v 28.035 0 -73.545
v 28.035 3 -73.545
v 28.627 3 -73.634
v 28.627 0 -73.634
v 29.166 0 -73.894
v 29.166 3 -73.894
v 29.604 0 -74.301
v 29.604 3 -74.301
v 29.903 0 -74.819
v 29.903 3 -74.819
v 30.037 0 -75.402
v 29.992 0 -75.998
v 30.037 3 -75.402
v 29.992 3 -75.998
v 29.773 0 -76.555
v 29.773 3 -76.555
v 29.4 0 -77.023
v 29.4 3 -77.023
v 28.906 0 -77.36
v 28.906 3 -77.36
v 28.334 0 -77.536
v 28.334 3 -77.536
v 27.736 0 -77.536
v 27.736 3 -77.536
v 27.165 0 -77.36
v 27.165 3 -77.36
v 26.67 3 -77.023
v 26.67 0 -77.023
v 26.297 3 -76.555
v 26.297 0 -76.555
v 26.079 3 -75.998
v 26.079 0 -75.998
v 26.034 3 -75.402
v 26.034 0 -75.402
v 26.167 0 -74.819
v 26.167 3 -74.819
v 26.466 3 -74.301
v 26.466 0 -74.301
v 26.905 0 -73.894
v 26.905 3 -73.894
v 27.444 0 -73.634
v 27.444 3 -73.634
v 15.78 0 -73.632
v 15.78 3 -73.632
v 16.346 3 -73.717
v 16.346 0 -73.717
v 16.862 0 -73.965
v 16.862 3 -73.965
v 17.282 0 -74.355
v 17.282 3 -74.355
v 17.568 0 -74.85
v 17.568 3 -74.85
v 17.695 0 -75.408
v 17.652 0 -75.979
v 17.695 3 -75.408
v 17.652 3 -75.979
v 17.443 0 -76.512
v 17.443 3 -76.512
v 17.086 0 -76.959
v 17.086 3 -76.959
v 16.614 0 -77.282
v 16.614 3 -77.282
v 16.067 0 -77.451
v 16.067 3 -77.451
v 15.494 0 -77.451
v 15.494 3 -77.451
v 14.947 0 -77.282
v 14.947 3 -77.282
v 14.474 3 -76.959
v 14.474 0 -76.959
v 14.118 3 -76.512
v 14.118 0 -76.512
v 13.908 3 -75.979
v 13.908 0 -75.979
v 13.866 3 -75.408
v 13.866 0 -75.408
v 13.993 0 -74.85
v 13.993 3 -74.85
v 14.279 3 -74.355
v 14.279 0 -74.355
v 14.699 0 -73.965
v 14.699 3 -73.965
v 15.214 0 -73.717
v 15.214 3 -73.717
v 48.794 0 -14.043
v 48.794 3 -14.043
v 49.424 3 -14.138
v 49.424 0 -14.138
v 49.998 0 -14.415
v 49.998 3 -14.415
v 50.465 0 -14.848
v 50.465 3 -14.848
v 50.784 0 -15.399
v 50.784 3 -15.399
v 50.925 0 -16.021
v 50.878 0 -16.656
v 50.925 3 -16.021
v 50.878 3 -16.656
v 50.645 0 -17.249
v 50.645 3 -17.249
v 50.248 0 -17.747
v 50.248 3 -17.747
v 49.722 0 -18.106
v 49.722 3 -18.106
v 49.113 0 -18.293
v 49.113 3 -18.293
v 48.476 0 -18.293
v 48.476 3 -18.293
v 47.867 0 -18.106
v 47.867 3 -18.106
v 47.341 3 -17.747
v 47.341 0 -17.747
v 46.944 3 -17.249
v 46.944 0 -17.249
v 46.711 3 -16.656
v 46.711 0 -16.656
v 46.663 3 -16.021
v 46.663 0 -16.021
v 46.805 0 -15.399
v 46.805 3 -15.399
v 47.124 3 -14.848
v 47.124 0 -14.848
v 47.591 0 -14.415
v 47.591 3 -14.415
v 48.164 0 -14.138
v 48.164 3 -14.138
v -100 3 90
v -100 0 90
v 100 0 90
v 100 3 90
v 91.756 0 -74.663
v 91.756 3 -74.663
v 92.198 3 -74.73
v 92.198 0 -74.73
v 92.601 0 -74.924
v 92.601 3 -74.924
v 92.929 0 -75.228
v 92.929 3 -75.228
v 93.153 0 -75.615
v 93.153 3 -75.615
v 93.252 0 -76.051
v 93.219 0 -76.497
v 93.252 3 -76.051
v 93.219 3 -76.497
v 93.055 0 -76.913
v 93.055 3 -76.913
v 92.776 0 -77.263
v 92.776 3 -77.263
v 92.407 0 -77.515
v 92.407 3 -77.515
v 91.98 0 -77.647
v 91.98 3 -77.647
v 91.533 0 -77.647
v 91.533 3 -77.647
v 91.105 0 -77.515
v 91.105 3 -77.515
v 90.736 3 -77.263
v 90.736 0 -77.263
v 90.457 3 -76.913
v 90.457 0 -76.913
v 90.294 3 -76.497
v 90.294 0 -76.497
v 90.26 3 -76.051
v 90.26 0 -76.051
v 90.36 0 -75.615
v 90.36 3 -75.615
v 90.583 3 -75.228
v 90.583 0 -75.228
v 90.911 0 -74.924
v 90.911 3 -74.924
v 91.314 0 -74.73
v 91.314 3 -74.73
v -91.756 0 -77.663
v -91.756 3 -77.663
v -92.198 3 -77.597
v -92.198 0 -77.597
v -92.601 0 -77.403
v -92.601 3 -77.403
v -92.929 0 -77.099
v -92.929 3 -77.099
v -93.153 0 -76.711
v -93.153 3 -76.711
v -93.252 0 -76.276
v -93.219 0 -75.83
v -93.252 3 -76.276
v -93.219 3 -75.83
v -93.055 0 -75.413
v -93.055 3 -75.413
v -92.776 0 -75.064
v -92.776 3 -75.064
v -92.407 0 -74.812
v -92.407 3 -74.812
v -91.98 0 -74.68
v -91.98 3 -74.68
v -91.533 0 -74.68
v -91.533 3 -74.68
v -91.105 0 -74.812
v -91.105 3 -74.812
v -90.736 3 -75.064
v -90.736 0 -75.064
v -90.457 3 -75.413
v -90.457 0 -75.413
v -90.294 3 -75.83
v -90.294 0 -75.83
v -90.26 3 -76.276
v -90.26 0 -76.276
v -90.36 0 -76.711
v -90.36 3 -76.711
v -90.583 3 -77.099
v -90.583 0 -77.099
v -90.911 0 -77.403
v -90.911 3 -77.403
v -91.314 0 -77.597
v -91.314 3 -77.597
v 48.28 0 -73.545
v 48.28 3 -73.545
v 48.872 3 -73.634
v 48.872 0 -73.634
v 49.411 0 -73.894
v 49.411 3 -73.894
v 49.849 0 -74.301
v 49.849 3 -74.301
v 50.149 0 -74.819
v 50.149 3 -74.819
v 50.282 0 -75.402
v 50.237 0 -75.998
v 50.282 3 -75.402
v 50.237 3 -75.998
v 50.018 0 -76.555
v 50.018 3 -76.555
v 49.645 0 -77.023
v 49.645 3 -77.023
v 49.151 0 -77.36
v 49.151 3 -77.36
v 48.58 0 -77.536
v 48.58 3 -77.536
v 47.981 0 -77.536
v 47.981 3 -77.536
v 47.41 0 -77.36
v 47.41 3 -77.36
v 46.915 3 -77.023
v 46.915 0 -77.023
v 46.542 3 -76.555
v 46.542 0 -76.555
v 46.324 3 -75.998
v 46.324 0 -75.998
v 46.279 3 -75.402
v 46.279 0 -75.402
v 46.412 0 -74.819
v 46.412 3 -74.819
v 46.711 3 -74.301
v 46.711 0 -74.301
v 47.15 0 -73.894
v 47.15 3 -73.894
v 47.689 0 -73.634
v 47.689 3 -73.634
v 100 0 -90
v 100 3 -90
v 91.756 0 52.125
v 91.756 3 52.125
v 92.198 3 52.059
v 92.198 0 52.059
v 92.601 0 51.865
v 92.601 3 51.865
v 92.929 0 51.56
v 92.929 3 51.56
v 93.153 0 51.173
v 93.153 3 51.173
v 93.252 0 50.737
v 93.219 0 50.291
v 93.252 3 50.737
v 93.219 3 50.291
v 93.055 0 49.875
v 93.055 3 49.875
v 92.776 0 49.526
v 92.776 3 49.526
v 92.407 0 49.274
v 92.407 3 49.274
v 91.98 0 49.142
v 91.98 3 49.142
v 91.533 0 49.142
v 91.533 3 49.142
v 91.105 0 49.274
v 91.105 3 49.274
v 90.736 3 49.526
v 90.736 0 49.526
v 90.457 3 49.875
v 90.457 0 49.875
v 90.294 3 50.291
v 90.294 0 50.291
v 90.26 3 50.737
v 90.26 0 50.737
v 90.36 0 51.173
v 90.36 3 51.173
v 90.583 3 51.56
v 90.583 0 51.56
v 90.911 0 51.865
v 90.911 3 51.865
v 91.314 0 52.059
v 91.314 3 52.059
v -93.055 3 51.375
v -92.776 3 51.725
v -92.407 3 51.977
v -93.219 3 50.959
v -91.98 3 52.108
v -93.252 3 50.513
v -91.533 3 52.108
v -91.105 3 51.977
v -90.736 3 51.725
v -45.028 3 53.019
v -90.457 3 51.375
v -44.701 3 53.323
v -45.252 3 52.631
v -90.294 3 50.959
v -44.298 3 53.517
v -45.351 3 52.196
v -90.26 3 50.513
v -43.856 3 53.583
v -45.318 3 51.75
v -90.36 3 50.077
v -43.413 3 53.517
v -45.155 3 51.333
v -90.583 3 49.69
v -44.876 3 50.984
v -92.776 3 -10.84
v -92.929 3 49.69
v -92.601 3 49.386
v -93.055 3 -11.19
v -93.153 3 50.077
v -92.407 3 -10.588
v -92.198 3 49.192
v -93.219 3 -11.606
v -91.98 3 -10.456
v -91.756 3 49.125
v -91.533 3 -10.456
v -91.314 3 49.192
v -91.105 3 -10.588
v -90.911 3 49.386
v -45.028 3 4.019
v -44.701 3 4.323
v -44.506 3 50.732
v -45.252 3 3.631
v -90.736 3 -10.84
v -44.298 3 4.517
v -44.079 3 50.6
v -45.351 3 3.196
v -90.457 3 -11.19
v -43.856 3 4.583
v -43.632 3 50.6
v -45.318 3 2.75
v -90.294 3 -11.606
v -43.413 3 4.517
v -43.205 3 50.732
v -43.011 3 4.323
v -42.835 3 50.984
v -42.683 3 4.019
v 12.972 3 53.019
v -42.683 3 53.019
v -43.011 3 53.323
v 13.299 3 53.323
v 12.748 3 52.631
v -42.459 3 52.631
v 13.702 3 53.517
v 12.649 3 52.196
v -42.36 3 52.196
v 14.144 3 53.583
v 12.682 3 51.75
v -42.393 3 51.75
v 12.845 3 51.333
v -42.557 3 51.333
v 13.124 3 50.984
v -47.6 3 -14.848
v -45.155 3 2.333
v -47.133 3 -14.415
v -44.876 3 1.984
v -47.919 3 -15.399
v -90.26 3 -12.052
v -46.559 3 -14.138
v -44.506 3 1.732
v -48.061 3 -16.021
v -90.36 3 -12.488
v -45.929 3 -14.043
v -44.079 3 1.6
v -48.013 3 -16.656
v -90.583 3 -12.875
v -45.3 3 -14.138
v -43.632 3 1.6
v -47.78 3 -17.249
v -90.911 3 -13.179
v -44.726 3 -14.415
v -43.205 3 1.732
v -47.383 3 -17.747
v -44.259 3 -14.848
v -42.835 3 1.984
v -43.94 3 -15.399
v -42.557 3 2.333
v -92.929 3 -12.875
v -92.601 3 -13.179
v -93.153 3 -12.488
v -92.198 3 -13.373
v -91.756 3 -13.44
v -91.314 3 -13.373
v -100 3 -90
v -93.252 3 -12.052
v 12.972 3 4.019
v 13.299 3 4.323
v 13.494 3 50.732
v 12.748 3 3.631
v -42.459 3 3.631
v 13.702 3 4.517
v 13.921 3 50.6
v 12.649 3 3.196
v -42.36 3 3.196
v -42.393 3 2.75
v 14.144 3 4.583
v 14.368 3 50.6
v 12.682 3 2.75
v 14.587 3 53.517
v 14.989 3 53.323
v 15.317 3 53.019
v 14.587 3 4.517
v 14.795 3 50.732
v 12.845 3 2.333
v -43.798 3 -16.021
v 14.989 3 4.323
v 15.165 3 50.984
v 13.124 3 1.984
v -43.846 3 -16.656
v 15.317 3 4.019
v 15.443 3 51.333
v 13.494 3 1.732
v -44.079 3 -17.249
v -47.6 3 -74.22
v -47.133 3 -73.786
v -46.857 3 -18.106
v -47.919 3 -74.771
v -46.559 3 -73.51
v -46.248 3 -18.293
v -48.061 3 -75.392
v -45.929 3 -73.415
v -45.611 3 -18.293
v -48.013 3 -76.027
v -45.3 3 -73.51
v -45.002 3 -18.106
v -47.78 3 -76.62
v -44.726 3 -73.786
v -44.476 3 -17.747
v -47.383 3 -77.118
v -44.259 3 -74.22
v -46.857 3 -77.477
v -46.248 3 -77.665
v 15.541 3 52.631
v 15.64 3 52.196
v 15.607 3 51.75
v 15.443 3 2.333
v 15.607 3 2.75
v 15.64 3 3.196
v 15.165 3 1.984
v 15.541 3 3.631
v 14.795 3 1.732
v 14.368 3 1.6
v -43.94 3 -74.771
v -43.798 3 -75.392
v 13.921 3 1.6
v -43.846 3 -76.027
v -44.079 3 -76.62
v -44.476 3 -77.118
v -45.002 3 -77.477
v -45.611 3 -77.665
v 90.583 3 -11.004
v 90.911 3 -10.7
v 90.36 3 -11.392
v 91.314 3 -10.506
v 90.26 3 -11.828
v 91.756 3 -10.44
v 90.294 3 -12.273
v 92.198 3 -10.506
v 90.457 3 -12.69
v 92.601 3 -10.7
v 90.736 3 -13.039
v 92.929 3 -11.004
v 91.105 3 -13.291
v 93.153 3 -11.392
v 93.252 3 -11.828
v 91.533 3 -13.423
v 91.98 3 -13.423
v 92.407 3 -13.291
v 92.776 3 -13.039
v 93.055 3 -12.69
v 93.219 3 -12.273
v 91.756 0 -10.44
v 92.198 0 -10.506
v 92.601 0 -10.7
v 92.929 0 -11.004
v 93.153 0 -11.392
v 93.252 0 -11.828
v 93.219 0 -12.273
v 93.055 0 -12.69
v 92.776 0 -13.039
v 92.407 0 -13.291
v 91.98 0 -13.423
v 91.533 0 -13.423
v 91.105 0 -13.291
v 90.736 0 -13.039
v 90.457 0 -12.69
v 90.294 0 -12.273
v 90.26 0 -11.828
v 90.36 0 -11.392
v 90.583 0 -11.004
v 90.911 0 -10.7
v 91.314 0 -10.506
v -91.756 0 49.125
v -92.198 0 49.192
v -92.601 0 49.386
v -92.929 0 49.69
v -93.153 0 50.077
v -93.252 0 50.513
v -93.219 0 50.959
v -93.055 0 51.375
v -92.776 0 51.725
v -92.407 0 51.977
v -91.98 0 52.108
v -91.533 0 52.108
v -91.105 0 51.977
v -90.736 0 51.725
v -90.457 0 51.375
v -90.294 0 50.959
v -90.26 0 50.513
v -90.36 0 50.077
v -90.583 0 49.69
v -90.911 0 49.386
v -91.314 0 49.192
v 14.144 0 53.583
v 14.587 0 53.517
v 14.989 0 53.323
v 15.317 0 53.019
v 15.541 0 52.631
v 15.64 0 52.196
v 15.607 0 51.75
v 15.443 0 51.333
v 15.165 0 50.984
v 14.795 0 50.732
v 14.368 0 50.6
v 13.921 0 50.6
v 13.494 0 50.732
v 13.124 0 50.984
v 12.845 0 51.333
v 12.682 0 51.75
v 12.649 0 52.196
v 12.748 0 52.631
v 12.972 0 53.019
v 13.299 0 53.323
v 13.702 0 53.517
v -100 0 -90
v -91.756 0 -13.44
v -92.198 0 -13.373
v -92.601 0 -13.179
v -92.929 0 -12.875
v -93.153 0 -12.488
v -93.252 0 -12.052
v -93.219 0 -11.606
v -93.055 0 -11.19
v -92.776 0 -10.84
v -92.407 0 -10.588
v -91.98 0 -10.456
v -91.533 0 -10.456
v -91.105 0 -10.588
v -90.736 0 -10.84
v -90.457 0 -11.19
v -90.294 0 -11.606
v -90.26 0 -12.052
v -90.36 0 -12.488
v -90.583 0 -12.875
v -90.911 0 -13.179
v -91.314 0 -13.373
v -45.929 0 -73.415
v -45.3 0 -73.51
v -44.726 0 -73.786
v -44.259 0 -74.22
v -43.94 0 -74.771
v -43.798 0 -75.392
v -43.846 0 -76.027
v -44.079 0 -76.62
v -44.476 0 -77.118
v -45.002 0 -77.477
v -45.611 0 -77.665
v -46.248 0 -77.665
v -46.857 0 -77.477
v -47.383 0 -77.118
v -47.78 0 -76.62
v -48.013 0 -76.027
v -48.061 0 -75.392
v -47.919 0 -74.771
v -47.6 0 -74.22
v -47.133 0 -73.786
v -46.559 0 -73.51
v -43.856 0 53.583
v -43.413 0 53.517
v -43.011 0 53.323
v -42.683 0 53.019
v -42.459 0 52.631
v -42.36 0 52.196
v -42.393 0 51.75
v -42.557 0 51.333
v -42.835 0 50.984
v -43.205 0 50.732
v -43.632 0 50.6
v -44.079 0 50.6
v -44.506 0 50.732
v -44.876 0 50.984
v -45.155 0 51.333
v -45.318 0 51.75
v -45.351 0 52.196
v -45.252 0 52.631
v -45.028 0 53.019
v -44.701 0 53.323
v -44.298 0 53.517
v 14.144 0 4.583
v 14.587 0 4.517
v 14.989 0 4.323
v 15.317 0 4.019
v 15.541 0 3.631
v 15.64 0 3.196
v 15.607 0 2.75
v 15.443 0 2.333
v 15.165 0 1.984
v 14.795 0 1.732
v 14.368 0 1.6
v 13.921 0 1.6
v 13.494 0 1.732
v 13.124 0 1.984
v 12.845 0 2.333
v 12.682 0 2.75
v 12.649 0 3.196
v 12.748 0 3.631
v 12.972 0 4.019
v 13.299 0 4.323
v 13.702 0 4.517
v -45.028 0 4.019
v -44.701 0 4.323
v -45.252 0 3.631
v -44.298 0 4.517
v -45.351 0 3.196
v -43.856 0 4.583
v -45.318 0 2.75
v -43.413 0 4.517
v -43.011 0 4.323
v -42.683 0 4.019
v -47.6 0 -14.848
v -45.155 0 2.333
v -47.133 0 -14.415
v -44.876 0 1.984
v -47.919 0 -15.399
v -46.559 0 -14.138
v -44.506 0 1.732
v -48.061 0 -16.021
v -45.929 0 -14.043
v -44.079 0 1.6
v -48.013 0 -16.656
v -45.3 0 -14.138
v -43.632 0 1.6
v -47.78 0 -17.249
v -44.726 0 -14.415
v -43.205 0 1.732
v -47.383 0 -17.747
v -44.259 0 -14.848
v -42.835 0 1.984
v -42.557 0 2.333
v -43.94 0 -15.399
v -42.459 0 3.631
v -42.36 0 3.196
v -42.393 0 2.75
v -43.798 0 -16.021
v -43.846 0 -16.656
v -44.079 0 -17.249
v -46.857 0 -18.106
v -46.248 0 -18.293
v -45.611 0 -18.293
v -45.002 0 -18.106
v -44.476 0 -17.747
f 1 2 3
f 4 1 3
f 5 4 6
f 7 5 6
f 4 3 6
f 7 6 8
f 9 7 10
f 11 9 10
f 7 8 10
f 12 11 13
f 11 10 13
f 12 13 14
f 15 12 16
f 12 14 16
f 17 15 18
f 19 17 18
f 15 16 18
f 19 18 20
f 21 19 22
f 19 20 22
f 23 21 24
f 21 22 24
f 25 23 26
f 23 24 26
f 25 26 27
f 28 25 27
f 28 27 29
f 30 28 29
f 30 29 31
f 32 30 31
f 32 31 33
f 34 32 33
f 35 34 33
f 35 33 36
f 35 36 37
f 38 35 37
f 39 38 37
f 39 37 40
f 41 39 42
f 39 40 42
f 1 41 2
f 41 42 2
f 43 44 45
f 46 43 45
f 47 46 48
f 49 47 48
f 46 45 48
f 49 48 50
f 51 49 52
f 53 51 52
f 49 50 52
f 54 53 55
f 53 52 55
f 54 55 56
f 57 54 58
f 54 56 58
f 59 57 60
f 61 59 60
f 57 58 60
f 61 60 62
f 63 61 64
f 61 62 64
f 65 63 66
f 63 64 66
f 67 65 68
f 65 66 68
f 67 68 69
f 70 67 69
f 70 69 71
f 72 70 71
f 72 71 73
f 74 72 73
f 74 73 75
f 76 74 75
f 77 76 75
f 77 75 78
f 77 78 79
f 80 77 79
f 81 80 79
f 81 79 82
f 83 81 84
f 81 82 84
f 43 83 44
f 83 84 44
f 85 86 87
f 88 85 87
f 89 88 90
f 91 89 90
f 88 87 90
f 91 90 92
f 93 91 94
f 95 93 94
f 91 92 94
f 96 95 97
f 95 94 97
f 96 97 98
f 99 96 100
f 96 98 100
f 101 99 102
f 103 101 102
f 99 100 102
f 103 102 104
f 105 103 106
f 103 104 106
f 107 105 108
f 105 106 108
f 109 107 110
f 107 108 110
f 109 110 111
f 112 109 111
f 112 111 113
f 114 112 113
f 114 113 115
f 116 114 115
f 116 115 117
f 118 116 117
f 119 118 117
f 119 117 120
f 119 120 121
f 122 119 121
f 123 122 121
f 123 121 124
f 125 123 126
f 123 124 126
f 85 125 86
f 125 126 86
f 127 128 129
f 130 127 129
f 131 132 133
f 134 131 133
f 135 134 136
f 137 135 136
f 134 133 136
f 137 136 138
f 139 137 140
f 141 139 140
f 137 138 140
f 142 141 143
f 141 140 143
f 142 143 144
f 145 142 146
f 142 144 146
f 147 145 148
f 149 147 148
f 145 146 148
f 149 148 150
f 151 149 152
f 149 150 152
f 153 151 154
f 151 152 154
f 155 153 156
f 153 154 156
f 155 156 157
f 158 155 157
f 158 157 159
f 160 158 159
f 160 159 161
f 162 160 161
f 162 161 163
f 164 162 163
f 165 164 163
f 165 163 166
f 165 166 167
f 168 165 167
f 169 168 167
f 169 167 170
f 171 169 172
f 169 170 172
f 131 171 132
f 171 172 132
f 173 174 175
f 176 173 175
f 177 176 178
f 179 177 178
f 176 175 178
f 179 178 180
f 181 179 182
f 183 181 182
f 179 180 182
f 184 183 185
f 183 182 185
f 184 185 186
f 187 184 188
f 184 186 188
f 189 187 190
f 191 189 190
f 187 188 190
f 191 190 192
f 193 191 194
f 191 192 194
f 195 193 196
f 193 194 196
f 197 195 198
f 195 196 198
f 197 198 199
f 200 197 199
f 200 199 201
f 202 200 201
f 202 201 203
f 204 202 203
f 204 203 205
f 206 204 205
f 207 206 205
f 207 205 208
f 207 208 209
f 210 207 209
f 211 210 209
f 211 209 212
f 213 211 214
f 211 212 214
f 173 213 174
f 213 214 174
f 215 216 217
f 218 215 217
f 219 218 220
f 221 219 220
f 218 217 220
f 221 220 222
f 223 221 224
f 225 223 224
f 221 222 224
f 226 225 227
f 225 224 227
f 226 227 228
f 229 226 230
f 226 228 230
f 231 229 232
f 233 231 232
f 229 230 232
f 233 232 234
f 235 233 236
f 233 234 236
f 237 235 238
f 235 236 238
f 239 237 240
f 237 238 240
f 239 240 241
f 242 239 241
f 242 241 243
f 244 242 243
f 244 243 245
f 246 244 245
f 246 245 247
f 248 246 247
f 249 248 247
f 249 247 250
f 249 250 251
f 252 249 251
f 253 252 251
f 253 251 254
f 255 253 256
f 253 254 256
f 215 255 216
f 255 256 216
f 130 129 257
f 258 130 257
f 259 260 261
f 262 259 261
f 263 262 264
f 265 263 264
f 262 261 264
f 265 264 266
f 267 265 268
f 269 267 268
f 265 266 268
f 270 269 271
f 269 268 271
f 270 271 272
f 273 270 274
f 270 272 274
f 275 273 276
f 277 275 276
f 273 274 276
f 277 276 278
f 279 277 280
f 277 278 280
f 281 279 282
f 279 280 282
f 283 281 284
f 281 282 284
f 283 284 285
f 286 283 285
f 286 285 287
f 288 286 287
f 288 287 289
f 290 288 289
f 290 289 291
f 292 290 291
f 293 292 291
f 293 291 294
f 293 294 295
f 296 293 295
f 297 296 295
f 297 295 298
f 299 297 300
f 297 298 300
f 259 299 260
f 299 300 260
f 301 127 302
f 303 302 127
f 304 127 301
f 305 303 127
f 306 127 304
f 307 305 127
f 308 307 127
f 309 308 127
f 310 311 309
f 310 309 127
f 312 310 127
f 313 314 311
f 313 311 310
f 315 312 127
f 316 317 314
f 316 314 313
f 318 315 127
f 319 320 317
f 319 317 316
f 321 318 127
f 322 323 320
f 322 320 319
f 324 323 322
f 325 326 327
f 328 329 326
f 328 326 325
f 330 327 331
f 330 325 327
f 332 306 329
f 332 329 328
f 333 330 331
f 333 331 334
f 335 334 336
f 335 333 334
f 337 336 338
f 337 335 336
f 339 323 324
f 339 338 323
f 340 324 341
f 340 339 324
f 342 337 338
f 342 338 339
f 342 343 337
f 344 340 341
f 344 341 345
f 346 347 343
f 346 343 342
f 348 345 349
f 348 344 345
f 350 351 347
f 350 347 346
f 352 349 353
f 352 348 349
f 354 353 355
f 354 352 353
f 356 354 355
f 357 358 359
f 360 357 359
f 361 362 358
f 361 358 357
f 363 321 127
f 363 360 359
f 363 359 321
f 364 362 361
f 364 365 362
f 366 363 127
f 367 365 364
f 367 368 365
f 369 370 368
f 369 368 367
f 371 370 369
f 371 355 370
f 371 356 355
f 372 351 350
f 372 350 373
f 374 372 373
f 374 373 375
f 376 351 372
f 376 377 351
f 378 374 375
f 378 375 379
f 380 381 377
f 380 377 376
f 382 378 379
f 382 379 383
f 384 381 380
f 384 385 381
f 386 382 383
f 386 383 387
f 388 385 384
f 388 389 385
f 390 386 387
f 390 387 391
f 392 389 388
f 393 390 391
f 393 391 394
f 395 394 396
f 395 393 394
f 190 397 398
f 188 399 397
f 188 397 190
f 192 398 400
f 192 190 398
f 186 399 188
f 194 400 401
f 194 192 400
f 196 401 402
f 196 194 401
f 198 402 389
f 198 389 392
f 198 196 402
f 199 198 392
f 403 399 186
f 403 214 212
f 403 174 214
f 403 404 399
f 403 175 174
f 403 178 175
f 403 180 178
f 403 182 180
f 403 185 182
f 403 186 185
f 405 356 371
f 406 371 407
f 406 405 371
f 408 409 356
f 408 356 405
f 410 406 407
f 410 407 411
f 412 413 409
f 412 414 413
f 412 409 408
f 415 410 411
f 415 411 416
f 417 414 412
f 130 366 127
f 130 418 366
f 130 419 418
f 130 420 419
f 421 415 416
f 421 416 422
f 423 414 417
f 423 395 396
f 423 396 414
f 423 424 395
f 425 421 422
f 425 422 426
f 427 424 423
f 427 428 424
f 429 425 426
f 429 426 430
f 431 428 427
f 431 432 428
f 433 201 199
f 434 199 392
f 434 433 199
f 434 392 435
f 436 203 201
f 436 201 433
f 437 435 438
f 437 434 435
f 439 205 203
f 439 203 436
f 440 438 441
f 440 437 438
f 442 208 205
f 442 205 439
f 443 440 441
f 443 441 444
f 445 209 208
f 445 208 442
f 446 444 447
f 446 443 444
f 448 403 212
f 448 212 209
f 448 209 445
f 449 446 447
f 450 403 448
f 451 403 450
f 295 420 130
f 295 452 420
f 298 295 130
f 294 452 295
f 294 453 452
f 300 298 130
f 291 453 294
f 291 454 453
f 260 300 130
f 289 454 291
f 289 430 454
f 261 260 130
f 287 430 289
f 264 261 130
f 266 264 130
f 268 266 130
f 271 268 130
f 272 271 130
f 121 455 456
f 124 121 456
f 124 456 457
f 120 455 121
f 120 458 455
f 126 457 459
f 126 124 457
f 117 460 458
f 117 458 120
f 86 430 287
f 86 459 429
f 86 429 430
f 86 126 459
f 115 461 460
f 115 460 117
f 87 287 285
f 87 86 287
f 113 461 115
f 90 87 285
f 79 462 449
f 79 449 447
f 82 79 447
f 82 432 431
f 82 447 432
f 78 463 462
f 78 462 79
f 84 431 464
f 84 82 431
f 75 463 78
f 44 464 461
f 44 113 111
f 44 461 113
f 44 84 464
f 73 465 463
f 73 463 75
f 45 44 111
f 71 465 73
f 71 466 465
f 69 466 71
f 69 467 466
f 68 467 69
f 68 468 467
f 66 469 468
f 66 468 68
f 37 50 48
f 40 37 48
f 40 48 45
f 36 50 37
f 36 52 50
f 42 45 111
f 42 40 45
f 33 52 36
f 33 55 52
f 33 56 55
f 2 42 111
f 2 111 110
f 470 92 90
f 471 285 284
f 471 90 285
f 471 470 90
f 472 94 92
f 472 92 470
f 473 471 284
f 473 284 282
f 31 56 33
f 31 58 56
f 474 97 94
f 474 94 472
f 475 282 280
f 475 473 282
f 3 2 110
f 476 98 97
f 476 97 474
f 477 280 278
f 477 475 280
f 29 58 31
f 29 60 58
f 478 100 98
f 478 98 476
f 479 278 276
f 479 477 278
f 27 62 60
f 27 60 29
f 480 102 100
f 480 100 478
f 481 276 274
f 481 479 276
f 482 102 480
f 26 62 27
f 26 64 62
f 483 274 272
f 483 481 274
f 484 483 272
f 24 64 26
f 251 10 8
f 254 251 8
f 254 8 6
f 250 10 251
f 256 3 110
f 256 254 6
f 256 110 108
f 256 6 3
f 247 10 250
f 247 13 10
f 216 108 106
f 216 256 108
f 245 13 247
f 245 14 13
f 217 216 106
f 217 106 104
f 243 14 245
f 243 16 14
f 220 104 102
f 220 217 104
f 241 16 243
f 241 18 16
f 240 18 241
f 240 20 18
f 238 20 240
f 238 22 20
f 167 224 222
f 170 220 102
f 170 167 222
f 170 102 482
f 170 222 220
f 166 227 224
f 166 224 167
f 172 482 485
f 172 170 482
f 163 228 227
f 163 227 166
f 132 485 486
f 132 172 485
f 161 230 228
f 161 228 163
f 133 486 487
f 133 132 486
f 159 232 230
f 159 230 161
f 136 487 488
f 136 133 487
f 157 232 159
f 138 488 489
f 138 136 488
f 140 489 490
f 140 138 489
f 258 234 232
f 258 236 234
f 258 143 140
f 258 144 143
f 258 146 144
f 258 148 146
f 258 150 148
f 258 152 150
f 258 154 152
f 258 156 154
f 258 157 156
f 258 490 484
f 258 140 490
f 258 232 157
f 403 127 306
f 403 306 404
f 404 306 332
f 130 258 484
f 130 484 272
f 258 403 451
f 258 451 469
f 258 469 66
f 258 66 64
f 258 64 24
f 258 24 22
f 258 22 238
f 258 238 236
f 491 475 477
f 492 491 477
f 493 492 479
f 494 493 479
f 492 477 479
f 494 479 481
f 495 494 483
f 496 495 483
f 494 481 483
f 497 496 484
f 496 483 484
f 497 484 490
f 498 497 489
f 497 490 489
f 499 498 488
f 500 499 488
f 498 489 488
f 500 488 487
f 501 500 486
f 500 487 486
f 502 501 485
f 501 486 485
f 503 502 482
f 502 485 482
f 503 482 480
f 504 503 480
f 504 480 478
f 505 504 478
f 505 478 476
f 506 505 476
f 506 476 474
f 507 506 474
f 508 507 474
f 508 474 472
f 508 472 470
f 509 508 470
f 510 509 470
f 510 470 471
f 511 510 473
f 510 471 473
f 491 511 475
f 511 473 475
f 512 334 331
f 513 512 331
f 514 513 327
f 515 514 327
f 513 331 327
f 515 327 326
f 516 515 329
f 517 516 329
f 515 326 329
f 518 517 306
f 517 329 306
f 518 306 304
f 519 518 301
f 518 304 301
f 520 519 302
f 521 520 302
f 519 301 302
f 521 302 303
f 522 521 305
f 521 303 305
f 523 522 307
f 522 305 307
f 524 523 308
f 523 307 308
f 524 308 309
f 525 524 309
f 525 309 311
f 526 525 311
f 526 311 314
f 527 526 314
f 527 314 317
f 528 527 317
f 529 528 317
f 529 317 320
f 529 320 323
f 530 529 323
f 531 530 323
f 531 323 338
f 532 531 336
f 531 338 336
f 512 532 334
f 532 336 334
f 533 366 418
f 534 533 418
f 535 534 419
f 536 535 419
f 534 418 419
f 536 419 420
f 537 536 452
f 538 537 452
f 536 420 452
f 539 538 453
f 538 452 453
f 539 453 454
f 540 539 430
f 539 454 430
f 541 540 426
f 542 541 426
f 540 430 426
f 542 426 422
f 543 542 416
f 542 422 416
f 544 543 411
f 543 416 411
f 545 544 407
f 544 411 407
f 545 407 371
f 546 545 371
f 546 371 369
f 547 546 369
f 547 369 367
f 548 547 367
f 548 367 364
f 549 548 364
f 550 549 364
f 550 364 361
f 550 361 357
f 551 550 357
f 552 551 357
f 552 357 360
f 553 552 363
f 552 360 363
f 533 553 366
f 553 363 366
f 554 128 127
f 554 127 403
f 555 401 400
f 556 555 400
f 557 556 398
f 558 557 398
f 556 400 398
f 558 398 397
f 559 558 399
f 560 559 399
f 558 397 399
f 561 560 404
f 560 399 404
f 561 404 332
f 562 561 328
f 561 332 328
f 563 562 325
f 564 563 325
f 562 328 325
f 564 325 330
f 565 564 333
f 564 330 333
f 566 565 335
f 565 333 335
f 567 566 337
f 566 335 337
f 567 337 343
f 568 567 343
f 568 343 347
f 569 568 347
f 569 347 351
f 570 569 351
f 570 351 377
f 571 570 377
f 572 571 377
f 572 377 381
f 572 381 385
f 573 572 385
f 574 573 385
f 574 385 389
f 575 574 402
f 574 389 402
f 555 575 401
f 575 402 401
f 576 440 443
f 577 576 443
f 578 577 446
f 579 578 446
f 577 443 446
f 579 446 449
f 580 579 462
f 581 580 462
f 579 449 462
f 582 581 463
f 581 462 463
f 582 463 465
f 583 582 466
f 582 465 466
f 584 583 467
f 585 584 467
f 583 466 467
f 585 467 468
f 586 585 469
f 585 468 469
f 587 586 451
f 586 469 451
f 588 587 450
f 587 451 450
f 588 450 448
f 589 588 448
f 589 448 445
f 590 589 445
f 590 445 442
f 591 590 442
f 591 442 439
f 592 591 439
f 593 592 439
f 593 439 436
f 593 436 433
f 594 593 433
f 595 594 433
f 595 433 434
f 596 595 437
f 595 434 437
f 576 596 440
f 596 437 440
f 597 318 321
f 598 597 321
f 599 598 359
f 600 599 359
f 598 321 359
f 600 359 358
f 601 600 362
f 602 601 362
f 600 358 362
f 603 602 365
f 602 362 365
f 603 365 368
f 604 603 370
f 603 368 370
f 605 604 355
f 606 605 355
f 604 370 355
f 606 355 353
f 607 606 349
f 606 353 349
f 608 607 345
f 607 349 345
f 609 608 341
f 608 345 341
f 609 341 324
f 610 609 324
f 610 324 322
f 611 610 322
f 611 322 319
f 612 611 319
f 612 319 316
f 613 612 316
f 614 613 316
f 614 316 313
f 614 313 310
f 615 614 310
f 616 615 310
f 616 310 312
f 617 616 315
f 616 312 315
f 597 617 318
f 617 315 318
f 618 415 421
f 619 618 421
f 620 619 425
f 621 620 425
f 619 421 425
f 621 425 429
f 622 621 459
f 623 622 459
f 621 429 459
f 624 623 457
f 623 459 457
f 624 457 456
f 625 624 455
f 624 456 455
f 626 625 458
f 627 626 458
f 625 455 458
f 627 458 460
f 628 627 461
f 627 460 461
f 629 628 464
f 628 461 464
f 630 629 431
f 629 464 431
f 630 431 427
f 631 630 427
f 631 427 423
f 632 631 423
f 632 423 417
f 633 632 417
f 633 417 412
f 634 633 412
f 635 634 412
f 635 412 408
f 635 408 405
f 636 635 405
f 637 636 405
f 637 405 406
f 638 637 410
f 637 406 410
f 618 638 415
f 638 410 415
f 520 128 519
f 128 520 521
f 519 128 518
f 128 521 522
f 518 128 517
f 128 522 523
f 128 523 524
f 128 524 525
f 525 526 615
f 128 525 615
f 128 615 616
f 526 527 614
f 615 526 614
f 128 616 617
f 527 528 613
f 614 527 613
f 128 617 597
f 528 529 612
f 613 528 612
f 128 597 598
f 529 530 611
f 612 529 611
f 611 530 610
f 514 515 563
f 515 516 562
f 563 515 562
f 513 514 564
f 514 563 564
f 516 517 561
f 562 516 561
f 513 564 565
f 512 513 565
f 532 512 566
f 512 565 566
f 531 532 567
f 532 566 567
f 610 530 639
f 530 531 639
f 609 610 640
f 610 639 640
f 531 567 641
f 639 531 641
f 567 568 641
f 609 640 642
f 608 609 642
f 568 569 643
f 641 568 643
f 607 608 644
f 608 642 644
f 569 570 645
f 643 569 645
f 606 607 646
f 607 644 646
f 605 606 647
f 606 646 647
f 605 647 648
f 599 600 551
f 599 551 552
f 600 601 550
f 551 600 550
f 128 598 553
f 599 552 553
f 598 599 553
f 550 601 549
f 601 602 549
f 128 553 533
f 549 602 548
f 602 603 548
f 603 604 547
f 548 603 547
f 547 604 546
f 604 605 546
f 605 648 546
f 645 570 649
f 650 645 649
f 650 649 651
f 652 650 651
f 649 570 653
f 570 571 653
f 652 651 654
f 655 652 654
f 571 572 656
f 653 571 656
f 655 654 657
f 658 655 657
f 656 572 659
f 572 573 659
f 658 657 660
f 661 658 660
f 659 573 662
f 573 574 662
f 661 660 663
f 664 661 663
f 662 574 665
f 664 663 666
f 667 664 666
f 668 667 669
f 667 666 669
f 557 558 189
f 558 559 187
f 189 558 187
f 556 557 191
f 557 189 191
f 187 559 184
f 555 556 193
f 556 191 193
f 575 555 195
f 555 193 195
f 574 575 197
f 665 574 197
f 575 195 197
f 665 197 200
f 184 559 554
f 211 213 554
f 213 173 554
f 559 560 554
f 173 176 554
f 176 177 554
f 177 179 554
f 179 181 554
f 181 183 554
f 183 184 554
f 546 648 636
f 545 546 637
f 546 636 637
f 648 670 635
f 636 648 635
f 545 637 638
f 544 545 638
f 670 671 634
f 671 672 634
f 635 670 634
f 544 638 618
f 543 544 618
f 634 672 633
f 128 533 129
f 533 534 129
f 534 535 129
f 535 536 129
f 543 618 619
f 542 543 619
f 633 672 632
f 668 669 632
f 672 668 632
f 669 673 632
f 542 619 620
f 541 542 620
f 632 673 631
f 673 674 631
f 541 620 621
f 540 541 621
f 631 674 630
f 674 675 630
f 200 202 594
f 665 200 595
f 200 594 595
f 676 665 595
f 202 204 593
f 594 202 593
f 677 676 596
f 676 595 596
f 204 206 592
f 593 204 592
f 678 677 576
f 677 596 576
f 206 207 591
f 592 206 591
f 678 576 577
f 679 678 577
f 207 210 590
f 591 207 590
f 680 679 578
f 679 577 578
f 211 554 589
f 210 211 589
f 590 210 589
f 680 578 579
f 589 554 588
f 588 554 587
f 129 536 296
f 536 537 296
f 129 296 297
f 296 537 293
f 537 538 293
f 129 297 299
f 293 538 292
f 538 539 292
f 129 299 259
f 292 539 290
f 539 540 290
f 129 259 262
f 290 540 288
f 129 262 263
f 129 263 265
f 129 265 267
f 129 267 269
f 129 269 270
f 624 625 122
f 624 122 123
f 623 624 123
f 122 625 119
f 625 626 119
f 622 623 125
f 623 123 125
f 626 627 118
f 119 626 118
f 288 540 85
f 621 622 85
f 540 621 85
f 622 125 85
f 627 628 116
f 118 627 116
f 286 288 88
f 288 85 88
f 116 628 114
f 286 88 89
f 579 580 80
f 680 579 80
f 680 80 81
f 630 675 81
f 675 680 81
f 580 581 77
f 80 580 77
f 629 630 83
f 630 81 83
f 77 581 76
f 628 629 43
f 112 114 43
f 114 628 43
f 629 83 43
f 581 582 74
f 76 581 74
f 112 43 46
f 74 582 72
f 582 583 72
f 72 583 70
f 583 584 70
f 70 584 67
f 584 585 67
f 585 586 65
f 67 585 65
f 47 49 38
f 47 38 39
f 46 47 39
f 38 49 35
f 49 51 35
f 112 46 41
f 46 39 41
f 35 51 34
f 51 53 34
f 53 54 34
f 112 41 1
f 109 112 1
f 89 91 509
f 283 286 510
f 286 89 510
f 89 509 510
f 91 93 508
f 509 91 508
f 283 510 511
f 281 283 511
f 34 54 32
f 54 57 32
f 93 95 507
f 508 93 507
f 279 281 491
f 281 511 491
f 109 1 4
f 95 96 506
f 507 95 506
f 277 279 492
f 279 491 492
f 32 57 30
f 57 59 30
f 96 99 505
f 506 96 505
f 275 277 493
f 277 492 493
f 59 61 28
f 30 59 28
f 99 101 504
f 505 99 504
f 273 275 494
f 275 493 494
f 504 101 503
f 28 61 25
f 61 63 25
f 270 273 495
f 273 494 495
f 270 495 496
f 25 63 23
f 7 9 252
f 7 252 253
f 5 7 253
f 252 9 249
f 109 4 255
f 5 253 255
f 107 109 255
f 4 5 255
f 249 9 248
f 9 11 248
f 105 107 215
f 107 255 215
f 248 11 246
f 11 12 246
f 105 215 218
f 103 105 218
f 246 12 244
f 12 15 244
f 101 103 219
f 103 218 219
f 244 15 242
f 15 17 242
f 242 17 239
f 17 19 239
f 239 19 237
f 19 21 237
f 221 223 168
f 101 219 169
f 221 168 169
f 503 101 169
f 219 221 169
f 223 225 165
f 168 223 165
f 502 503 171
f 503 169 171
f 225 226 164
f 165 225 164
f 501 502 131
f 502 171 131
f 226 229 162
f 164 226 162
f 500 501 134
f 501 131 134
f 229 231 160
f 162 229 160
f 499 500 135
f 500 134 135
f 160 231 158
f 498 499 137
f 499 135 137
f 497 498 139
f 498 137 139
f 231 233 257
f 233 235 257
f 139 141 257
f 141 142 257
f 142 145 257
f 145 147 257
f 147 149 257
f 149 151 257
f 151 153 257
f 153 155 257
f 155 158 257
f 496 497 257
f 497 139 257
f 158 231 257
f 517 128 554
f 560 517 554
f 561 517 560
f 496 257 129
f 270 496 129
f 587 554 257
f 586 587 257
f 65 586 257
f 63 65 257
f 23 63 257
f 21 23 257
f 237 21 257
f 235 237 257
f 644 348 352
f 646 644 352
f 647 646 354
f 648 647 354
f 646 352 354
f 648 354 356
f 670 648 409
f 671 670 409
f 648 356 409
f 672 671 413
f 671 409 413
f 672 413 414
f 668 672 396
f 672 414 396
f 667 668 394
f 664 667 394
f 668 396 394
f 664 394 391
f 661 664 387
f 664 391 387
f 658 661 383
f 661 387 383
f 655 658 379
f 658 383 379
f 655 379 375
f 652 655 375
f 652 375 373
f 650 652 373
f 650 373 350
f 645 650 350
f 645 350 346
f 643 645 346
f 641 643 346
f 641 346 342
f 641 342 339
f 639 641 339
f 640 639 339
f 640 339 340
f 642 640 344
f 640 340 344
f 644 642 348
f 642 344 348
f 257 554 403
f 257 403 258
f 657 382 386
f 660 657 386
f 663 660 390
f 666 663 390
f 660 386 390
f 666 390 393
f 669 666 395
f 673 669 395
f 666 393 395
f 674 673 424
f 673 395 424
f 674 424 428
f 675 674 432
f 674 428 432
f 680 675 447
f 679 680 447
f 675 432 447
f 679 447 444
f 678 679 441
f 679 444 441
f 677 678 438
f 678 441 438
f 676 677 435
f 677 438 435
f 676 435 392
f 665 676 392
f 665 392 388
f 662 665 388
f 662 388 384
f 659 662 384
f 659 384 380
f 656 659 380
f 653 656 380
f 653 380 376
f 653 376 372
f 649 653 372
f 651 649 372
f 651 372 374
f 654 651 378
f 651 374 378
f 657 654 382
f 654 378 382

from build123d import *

# Parameters (mm, degrees)
SKETCH_1_W          = 200
SKETCH_1_H          = 180
EXTRUDE_1_DEPTH     = 3
SKETCH_2_R          = 1.5
CUT_EXTRUDE_1_DEPTH = 3
SKETCH_3_R          = 1.5
CUT_EXTRUDE_2_DEPTH = 3
SKETCH_4_R          = 2.137012609
SKETCH_4_R_2        = 2.00688496
SKETCH_4_R_3        = 1.920113274
CUT_EXTRUDE_3_DEPTH = 3


with BuildPart() as part:
    # 草图1 → 凸台-拉伸1 (new body)
    with BuildSketch(Plane(origin=(0, 0, 0), x_dir=(1, 0, 0), z_dir=(0, 1, 0))):
        Rectangle(SKETCH_1_W, SKETCH_1_H)
    extrude(amount=EXTRUDE_1_DEPTH)

    # 草图2 → 切除-拉伸1 (cut)
    with BuildSketch(Plane(origin=(0, 3, 0), x_dir=(1, 0, 0), z_dir=(0, 1, 0))):
        with Locations(Location((91.756220162, 76.163438047, 0), (0, 0, 270))):
            Circle(SKETCH_2_R)
        with Locations(Location((91.756220162, 11.939610887, 0), (0, 0, 270))):
            Circle(SKETCH_2_R)
        with Locations(Location((91.756220162, -50.625190386, 0), (0, 0, 270))):
            Circle(SKETCH_2_R)
        with Locations(Location((-91.756220162, 76.163438047, 0), (0, 0, 90))):
            Circle(SKETCH_2_R)
        with Locations(Location((-91.756220162, 11.939610887, 0), (0, 0, 90))):
            Circle(SKETCH_2_R)
        with Locations(Location((-91.756220162, -50.625190386, 0), (0, 0, 90))):
            Circle(SKETCH_2_R)
    extrude(amount=-CUT_EXTRUDE_1_DEPTH, mode=Mode.SUBTRACT)

    # 草图3 → 切除-拉伸2 (cut)
    with BuildSketch(Plane(origin=(0, 3, 0), x_dir=(1, 0, 0), z_dir=(0, 1, 0))):
        with Locations(Location((14.144450177, -3.083468073, 0), (0, 0, 270))):
            Circle(SKETCH_3_R)
        with Locations(Location((14.144450177, -52.083468073, 0), (0, 0, 270))):
            Circle(SKETCH_3_R)
        with Locations(Location((-43.855549823, -52.083468073, 0), (0, 0, 270))):
            Circle(SKETCH_3_R)
        with Locations(Location((-43.855549823, -3.083468073, 0), (0, 0, 270))):
            Circle(SKETCH_3_R)
    extrude(amount=-CUT_EXTRUDE_2_DEPTH, mode=Mode.SUBTRACT)

    # 草图4 → 切除-拉伸3 (cut)
    with BuildSketch(Plane(origin=(0, 3, 0), x_dir=(1, 0, 0), z_dir=(0, 1, 0))):
        with Locations(Location((48.794365555, 16.180217446, 0), (0, 0, 270))):
            Circle(SKETCH_4_R)
        with Locations(Location((48.28042953, 75.551923117, 0), (0, 0, 270))):
            Circle(SKETCH_4_R_2)
        with Locations(Location((28.035307004, 75.551923117, 0), (0, 0, 270))):
            Circle(SKETCH_4_R_2)
        with Locations(Location((15.78042953, 75.551923117, 0), (0, 0, 270))):
            Circle(SKETCH_4_R_3)
        with Locations(Location((-45.929479507, 75.551923117, 0), (0, 0, 270))):
            Circle(SKETCH_4_R)
        with Locations(Location((-45.929479507, 16.180217446, 0), (0, 0, 270))):
            Circle(SKETCH_4_R)
    extrude(amount=-CUT_EXTRUDE_3_DEPTH, mode=Mode.SUBTRACT)


solid = part.part
